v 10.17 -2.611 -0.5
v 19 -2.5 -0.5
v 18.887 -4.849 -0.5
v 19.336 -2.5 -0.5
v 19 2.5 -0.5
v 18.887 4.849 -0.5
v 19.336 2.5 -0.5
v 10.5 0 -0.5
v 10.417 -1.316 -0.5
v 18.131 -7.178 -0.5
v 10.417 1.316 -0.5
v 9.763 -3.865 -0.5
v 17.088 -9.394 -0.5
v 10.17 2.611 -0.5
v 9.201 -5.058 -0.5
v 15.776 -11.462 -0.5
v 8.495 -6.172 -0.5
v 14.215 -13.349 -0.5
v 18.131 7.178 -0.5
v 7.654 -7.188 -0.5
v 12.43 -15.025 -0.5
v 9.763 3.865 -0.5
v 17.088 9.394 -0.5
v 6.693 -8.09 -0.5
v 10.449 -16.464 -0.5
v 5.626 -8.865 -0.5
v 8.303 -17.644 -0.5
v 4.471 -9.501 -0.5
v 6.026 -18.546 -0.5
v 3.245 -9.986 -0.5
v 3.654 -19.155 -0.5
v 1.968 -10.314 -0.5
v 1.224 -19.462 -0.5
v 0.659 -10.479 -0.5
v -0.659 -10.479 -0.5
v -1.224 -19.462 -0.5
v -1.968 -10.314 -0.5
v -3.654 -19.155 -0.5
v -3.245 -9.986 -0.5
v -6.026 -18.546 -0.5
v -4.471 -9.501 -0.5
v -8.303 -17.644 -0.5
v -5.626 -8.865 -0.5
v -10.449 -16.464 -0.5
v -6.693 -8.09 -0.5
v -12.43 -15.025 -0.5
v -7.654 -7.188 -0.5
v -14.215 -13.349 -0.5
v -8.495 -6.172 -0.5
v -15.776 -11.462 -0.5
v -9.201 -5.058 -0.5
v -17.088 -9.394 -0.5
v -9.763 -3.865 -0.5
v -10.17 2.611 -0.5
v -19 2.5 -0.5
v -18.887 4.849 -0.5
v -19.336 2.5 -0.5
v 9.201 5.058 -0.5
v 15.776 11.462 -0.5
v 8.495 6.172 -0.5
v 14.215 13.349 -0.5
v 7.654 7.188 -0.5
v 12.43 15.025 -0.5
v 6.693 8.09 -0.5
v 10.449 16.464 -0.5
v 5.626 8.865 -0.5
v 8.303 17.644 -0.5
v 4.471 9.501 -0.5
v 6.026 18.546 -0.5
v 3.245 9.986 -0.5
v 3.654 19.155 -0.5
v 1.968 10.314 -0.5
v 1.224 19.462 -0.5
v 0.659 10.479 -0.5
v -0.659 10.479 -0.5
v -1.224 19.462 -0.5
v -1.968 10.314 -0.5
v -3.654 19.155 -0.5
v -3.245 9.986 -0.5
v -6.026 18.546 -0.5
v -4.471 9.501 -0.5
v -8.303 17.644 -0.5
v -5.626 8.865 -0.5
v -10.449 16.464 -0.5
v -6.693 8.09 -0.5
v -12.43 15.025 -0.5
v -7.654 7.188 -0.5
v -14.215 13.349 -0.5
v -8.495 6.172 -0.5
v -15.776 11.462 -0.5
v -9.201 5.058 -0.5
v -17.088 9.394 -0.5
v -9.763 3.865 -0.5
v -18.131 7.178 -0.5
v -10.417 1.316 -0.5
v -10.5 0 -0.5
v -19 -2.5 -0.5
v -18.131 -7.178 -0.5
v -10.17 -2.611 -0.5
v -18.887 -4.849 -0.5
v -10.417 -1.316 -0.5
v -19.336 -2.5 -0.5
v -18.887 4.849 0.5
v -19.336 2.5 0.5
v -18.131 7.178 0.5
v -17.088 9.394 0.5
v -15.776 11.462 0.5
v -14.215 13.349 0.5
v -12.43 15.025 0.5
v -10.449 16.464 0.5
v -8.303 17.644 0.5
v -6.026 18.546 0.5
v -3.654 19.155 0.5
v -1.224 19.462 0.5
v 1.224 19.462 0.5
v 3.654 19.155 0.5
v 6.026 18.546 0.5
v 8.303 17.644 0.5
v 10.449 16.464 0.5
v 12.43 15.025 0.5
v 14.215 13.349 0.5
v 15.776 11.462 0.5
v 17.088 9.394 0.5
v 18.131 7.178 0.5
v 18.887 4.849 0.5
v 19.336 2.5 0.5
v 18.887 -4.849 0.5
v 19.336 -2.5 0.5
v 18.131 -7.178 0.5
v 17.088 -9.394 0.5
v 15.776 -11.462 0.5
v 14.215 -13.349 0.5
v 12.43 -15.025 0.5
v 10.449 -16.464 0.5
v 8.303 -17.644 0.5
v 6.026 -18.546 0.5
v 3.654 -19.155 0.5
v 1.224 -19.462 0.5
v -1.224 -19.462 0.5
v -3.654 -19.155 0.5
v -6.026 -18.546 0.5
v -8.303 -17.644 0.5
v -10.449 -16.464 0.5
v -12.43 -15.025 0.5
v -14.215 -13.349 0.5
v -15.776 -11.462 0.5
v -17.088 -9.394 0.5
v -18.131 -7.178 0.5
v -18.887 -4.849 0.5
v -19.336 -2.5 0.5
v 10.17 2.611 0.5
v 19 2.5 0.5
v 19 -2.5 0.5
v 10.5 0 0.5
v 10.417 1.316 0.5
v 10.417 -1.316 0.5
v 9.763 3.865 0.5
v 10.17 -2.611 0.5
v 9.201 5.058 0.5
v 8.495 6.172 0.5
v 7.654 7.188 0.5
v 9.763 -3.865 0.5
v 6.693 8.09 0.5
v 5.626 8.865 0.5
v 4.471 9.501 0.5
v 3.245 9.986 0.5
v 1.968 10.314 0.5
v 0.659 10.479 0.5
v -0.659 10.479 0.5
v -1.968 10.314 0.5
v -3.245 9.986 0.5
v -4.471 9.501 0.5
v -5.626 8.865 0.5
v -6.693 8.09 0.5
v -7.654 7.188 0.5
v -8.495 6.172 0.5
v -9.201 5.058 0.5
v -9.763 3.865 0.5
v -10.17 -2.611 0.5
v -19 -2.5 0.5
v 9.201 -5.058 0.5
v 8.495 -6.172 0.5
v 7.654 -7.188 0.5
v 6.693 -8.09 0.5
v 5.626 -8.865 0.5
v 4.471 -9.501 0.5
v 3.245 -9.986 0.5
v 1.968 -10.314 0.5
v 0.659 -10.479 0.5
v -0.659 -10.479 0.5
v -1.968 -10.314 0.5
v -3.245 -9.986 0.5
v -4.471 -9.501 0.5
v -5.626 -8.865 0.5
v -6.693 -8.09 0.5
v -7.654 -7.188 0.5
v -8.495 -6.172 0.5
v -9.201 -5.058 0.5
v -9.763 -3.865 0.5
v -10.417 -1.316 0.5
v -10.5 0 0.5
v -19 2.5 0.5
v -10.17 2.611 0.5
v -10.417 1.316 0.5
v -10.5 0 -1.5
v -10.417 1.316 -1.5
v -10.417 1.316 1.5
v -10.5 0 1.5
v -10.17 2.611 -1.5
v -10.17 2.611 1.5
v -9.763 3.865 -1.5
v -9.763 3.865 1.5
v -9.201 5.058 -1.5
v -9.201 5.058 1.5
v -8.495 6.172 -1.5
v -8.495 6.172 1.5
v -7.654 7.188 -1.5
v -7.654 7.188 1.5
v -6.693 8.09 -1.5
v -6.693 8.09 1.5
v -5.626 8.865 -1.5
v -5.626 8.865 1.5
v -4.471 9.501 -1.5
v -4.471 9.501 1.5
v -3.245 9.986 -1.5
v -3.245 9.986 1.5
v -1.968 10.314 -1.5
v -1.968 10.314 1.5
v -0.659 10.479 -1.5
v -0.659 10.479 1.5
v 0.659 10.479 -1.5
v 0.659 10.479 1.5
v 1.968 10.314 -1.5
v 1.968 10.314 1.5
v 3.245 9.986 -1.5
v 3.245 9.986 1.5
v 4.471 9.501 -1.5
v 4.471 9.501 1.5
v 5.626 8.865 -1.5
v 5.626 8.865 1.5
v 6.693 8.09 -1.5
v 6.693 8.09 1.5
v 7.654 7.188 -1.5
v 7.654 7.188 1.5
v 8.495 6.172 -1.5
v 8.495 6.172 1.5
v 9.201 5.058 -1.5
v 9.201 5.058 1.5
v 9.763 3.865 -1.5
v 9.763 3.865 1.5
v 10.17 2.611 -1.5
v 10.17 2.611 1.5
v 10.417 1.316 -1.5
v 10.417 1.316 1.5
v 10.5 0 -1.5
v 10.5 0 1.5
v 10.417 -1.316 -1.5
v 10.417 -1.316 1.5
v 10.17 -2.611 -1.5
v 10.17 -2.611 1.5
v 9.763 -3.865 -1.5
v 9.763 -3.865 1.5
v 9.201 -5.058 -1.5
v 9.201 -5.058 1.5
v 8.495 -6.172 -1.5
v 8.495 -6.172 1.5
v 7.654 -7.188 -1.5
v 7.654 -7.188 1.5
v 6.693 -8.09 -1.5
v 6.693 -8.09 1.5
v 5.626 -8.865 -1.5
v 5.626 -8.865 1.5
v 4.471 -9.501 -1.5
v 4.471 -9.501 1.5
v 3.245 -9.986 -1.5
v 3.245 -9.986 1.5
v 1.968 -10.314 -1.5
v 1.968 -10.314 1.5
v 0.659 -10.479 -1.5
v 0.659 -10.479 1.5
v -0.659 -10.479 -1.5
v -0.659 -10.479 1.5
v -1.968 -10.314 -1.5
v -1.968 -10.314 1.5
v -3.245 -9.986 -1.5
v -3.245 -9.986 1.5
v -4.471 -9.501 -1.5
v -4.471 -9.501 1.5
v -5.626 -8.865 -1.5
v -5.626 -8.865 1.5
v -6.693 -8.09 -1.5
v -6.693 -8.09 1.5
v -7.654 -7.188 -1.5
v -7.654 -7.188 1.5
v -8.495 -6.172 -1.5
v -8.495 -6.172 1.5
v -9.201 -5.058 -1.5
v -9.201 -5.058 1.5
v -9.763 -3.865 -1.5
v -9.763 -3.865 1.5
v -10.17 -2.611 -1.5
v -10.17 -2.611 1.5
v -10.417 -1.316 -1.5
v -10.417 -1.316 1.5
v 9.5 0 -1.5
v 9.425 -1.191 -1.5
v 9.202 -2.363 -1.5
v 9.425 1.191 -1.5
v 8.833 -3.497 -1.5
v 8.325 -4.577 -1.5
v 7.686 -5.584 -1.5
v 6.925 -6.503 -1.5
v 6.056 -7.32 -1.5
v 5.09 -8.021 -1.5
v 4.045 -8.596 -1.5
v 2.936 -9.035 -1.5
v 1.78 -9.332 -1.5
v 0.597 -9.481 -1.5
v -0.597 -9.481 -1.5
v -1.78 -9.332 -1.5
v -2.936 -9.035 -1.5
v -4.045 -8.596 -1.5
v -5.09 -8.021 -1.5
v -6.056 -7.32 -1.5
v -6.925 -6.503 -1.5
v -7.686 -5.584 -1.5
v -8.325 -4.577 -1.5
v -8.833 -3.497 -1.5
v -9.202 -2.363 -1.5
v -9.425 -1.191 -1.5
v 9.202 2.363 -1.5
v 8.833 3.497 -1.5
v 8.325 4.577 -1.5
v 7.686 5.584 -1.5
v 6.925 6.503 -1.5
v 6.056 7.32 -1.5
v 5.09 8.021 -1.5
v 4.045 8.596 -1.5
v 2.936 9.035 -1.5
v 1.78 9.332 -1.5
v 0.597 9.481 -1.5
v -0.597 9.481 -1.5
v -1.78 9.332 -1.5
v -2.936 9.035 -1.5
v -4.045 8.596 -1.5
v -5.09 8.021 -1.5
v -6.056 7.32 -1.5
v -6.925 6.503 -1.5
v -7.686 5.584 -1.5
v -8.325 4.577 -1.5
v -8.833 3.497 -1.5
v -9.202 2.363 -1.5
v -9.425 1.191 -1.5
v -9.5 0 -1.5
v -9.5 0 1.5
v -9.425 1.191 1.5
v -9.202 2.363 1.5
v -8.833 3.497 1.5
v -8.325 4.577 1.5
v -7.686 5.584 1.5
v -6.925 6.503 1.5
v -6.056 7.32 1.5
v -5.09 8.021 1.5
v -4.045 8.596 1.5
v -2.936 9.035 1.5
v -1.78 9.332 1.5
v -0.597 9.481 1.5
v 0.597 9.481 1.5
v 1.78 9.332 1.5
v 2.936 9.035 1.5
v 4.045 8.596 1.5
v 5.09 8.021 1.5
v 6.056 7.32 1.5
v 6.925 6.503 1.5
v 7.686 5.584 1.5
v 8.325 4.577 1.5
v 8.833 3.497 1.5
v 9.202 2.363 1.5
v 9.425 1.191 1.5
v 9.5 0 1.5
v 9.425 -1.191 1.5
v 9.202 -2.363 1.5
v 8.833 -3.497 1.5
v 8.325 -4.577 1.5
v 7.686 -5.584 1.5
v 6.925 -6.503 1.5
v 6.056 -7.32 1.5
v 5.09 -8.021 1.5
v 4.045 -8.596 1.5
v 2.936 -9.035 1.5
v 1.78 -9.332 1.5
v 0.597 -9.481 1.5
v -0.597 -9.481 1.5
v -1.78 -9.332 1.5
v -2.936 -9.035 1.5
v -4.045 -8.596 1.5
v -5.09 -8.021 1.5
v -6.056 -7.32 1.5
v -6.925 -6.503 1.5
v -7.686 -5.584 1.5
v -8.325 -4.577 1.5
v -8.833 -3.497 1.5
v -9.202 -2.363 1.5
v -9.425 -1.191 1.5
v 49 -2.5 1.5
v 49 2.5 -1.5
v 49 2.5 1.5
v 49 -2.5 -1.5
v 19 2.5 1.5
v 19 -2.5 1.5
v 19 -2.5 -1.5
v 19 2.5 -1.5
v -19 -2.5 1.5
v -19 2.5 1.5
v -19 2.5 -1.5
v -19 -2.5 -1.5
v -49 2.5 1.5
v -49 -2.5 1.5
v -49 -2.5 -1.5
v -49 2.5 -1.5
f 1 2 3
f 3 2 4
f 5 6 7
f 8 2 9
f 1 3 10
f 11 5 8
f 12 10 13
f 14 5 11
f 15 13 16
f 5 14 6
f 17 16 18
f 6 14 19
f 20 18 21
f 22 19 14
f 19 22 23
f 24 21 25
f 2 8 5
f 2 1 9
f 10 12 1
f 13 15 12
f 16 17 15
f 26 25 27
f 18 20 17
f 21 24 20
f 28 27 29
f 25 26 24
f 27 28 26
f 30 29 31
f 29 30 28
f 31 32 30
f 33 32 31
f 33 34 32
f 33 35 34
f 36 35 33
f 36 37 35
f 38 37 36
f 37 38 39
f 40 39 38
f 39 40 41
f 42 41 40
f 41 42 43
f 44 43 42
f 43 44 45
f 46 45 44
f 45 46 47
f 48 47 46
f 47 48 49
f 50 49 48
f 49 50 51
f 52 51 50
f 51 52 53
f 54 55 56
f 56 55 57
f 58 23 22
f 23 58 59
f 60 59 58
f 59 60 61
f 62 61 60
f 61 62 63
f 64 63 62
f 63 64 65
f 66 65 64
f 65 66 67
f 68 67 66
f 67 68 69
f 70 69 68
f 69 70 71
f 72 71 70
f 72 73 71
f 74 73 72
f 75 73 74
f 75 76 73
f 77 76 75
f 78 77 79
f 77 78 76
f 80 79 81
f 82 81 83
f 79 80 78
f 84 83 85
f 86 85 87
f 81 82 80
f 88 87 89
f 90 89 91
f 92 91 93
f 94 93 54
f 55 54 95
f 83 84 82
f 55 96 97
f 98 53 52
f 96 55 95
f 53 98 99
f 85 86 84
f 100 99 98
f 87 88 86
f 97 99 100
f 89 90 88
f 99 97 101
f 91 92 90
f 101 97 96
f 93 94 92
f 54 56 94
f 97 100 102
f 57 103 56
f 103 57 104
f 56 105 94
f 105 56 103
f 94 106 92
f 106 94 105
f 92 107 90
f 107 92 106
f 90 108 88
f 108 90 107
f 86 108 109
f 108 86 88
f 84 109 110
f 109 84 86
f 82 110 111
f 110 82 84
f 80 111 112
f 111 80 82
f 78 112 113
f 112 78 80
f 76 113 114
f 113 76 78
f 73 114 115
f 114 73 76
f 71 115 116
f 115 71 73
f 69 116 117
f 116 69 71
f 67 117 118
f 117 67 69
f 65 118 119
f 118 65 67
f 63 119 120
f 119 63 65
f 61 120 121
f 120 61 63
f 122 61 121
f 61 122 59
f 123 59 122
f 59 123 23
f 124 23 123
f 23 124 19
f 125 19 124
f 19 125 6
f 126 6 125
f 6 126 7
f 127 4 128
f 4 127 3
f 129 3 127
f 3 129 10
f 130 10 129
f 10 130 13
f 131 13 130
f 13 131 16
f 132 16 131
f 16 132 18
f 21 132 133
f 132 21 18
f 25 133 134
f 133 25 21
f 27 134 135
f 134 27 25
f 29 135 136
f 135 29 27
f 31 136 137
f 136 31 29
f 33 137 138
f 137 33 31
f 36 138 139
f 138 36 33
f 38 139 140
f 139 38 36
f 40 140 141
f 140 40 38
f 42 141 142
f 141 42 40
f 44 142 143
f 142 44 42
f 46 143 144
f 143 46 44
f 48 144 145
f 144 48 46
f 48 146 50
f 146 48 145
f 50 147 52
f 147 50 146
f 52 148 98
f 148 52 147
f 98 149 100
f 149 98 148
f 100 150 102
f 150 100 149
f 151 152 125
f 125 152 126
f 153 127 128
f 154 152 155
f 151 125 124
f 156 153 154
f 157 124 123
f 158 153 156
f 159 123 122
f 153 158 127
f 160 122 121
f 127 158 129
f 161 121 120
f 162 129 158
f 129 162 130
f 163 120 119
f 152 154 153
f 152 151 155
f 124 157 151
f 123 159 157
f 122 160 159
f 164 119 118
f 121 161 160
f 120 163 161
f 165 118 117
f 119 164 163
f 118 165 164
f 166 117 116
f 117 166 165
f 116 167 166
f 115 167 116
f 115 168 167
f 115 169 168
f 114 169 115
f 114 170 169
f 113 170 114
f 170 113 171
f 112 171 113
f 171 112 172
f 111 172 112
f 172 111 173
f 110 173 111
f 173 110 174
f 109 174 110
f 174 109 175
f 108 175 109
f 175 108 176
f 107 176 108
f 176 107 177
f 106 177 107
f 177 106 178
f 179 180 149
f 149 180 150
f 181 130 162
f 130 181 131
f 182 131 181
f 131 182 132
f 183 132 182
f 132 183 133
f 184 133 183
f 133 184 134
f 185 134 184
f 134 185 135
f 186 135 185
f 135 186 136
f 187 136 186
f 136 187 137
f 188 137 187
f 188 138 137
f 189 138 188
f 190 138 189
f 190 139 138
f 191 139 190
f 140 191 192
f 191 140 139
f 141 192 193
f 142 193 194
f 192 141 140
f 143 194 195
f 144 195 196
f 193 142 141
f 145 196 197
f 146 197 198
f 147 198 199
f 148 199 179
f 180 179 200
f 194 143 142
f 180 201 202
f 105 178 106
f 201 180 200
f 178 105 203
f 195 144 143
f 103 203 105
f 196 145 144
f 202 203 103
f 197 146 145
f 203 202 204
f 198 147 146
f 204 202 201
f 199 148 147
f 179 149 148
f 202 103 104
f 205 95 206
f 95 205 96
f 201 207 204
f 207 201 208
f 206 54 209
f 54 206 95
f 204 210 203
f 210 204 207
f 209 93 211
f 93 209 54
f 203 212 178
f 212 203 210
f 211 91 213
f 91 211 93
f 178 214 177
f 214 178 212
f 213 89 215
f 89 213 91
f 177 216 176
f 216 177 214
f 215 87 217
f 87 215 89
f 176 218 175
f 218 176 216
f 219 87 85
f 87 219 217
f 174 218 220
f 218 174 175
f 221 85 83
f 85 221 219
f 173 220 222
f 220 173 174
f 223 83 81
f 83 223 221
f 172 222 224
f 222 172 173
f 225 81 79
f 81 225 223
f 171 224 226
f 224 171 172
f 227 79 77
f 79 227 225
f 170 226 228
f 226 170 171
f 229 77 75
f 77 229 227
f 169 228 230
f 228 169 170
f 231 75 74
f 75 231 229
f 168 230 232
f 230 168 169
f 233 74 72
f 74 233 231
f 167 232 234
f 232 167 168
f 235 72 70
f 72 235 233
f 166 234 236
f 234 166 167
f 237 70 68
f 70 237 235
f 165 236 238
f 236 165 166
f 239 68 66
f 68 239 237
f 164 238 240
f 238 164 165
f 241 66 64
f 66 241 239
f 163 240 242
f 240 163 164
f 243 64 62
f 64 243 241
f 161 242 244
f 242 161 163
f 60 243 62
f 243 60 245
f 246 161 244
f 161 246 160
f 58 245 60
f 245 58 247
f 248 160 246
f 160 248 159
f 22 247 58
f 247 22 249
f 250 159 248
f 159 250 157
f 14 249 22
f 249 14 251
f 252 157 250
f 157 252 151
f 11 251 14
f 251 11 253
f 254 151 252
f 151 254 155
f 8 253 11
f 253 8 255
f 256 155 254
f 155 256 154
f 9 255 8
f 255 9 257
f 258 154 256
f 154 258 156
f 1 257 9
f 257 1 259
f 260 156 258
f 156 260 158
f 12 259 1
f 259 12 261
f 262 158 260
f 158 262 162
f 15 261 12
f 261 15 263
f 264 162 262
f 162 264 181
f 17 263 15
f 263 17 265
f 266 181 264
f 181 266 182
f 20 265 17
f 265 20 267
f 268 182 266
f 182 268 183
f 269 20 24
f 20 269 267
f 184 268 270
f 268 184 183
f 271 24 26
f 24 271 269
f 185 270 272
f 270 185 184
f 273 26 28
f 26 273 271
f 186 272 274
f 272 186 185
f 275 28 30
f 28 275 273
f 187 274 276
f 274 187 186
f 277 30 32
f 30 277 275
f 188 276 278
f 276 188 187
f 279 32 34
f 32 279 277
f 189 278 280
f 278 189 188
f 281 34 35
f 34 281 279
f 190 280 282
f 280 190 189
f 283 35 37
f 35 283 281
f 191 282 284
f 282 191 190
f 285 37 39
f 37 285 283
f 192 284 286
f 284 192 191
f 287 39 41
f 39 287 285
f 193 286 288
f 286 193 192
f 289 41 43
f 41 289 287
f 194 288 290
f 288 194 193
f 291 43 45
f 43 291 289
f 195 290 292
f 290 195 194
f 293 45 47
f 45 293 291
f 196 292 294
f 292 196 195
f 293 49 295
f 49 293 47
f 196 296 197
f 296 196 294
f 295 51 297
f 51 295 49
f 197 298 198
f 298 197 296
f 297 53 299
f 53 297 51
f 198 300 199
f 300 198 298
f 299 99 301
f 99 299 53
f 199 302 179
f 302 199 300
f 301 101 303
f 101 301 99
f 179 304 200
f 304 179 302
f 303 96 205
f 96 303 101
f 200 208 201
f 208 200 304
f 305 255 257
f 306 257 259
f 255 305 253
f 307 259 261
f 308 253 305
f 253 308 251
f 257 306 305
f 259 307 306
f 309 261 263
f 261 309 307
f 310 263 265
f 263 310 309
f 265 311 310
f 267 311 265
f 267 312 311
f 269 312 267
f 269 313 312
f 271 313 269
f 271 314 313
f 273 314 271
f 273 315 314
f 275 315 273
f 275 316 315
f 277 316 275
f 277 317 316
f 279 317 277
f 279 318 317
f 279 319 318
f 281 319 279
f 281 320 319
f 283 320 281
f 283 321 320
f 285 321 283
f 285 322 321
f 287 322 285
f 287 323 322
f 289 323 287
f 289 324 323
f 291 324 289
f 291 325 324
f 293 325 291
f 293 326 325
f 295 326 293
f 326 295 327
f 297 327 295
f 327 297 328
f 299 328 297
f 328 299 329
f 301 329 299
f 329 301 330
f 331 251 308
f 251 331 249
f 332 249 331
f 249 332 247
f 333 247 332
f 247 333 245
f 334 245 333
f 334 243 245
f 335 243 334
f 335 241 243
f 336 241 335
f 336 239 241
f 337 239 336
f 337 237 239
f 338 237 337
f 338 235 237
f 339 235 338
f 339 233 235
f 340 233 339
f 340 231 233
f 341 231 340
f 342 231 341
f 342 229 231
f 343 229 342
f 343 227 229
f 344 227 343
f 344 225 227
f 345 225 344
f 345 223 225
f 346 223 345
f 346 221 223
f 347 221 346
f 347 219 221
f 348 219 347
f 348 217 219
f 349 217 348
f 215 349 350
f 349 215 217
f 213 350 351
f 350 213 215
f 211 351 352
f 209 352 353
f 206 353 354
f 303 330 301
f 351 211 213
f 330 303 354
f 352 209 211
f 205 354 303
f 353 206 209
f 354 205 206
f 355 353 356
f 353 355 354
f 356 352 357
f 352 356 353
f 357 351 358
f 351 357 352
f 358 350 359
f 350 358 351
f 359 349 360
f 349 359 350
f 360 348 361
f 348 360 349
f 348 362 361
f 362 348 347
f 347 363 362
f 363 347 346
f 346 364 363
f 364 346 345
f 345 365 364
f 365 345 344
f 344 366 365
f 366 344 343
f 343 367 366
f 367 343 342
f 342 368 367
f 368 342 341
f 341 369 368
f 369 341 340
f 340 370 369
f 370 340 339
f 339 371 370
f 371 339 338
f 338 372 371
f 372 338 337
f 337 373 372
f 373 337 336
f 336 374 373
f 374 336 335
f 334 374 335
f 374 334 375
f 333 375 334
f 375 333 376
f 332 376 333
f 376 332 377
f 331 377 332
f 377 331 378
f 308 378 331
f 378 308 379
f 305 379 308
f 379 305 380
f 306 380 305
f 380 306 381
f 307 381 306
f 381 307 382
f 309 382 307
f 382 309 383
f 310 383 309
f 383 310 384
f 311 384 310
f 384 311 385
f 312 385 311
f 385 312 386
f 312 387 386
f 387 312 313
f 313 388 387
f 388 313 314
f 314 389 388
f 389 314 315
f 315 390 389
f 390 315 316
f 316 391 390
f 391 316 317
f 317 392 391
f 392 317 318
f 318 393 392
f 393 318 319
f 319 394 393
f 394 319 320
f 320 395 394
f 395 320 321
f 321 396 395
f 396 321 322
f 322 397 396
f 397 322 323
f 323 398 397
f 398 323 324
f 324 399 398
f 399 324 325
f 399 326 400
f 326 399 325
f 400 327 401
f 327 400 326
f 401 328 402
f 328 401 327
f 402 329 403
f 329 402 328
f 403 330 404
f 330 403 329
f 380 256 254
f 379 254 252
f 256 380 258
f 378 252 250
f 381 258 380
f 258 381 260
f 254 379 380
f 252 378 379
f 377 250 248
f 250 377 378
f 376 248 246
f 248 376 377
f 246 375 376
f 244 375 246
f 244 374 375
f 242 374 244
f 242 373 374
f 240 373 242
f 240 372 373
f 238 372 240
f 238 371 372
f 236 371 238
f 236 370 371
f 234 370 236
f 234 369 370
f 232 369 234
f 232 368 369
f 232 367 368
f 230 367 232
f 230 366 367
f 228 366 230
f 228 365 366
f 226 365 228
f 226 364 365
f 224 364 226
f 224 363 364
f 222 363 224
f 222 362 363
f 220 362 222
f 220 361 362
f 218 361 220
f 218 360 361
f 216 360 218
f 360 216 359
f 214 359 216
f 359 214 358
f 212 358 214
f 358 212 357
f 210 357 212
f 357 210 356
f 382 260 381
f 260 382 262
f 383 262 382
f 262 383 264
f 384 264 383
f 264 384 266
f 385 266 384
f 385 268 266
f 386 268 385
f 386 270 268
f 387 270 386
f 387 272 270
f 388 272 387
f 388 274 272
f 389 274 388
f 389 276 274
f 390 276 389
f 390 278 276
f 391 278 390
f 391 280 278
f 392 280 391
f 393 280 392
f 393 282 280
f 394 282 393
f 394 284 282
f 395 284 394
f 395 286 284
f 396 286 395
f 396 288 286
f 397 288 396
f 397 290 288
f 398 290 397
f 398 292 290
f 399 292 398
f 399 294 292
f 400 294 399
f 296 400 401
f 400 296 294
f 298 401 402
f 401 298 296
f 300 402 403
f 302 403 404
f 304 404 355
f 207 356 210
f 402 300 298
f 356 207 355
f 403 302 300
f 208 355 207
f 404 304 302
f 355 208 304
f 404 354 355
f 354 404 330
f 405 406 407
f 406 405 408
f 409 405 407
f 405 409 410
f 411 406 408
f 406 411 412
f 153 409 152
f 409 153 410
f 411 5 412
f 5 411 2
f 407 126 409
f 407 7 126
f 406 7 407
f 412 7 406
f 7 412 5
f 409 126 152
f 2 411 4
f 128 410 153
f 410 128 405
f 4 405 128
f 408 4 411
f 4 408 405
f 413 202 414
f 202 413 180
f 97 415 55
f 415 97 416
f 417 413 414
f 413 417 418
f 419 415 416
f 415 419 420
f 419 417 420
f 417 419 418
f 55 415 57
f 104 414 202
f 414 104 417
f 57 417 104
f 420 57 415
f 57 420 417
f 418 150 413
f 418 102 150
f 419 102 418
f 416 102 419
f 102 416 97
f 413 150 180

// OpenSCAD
$fn=50;

module outring(){
	rotate_extrude(convexity = 10)
    translate([19, 0, 0])
    square(size = [1,1],center = true);
}

module midring(){
	rotate_extrude(convexity = 10)
    translate([14.5, 0, 0])
    square(size = [8,1],center = true);
}

module innerring(){
	rotate_extrude(convexity = 10)
    translate([10, 0, 0])
    square(size = [1,3],center = true);
}
outring();
midring();
innerring();

translate([34,0,0]) cube(size = [30,5,3], center = true);
translate([-34,0,0]) cube(size = [30,5,3], center = true);
